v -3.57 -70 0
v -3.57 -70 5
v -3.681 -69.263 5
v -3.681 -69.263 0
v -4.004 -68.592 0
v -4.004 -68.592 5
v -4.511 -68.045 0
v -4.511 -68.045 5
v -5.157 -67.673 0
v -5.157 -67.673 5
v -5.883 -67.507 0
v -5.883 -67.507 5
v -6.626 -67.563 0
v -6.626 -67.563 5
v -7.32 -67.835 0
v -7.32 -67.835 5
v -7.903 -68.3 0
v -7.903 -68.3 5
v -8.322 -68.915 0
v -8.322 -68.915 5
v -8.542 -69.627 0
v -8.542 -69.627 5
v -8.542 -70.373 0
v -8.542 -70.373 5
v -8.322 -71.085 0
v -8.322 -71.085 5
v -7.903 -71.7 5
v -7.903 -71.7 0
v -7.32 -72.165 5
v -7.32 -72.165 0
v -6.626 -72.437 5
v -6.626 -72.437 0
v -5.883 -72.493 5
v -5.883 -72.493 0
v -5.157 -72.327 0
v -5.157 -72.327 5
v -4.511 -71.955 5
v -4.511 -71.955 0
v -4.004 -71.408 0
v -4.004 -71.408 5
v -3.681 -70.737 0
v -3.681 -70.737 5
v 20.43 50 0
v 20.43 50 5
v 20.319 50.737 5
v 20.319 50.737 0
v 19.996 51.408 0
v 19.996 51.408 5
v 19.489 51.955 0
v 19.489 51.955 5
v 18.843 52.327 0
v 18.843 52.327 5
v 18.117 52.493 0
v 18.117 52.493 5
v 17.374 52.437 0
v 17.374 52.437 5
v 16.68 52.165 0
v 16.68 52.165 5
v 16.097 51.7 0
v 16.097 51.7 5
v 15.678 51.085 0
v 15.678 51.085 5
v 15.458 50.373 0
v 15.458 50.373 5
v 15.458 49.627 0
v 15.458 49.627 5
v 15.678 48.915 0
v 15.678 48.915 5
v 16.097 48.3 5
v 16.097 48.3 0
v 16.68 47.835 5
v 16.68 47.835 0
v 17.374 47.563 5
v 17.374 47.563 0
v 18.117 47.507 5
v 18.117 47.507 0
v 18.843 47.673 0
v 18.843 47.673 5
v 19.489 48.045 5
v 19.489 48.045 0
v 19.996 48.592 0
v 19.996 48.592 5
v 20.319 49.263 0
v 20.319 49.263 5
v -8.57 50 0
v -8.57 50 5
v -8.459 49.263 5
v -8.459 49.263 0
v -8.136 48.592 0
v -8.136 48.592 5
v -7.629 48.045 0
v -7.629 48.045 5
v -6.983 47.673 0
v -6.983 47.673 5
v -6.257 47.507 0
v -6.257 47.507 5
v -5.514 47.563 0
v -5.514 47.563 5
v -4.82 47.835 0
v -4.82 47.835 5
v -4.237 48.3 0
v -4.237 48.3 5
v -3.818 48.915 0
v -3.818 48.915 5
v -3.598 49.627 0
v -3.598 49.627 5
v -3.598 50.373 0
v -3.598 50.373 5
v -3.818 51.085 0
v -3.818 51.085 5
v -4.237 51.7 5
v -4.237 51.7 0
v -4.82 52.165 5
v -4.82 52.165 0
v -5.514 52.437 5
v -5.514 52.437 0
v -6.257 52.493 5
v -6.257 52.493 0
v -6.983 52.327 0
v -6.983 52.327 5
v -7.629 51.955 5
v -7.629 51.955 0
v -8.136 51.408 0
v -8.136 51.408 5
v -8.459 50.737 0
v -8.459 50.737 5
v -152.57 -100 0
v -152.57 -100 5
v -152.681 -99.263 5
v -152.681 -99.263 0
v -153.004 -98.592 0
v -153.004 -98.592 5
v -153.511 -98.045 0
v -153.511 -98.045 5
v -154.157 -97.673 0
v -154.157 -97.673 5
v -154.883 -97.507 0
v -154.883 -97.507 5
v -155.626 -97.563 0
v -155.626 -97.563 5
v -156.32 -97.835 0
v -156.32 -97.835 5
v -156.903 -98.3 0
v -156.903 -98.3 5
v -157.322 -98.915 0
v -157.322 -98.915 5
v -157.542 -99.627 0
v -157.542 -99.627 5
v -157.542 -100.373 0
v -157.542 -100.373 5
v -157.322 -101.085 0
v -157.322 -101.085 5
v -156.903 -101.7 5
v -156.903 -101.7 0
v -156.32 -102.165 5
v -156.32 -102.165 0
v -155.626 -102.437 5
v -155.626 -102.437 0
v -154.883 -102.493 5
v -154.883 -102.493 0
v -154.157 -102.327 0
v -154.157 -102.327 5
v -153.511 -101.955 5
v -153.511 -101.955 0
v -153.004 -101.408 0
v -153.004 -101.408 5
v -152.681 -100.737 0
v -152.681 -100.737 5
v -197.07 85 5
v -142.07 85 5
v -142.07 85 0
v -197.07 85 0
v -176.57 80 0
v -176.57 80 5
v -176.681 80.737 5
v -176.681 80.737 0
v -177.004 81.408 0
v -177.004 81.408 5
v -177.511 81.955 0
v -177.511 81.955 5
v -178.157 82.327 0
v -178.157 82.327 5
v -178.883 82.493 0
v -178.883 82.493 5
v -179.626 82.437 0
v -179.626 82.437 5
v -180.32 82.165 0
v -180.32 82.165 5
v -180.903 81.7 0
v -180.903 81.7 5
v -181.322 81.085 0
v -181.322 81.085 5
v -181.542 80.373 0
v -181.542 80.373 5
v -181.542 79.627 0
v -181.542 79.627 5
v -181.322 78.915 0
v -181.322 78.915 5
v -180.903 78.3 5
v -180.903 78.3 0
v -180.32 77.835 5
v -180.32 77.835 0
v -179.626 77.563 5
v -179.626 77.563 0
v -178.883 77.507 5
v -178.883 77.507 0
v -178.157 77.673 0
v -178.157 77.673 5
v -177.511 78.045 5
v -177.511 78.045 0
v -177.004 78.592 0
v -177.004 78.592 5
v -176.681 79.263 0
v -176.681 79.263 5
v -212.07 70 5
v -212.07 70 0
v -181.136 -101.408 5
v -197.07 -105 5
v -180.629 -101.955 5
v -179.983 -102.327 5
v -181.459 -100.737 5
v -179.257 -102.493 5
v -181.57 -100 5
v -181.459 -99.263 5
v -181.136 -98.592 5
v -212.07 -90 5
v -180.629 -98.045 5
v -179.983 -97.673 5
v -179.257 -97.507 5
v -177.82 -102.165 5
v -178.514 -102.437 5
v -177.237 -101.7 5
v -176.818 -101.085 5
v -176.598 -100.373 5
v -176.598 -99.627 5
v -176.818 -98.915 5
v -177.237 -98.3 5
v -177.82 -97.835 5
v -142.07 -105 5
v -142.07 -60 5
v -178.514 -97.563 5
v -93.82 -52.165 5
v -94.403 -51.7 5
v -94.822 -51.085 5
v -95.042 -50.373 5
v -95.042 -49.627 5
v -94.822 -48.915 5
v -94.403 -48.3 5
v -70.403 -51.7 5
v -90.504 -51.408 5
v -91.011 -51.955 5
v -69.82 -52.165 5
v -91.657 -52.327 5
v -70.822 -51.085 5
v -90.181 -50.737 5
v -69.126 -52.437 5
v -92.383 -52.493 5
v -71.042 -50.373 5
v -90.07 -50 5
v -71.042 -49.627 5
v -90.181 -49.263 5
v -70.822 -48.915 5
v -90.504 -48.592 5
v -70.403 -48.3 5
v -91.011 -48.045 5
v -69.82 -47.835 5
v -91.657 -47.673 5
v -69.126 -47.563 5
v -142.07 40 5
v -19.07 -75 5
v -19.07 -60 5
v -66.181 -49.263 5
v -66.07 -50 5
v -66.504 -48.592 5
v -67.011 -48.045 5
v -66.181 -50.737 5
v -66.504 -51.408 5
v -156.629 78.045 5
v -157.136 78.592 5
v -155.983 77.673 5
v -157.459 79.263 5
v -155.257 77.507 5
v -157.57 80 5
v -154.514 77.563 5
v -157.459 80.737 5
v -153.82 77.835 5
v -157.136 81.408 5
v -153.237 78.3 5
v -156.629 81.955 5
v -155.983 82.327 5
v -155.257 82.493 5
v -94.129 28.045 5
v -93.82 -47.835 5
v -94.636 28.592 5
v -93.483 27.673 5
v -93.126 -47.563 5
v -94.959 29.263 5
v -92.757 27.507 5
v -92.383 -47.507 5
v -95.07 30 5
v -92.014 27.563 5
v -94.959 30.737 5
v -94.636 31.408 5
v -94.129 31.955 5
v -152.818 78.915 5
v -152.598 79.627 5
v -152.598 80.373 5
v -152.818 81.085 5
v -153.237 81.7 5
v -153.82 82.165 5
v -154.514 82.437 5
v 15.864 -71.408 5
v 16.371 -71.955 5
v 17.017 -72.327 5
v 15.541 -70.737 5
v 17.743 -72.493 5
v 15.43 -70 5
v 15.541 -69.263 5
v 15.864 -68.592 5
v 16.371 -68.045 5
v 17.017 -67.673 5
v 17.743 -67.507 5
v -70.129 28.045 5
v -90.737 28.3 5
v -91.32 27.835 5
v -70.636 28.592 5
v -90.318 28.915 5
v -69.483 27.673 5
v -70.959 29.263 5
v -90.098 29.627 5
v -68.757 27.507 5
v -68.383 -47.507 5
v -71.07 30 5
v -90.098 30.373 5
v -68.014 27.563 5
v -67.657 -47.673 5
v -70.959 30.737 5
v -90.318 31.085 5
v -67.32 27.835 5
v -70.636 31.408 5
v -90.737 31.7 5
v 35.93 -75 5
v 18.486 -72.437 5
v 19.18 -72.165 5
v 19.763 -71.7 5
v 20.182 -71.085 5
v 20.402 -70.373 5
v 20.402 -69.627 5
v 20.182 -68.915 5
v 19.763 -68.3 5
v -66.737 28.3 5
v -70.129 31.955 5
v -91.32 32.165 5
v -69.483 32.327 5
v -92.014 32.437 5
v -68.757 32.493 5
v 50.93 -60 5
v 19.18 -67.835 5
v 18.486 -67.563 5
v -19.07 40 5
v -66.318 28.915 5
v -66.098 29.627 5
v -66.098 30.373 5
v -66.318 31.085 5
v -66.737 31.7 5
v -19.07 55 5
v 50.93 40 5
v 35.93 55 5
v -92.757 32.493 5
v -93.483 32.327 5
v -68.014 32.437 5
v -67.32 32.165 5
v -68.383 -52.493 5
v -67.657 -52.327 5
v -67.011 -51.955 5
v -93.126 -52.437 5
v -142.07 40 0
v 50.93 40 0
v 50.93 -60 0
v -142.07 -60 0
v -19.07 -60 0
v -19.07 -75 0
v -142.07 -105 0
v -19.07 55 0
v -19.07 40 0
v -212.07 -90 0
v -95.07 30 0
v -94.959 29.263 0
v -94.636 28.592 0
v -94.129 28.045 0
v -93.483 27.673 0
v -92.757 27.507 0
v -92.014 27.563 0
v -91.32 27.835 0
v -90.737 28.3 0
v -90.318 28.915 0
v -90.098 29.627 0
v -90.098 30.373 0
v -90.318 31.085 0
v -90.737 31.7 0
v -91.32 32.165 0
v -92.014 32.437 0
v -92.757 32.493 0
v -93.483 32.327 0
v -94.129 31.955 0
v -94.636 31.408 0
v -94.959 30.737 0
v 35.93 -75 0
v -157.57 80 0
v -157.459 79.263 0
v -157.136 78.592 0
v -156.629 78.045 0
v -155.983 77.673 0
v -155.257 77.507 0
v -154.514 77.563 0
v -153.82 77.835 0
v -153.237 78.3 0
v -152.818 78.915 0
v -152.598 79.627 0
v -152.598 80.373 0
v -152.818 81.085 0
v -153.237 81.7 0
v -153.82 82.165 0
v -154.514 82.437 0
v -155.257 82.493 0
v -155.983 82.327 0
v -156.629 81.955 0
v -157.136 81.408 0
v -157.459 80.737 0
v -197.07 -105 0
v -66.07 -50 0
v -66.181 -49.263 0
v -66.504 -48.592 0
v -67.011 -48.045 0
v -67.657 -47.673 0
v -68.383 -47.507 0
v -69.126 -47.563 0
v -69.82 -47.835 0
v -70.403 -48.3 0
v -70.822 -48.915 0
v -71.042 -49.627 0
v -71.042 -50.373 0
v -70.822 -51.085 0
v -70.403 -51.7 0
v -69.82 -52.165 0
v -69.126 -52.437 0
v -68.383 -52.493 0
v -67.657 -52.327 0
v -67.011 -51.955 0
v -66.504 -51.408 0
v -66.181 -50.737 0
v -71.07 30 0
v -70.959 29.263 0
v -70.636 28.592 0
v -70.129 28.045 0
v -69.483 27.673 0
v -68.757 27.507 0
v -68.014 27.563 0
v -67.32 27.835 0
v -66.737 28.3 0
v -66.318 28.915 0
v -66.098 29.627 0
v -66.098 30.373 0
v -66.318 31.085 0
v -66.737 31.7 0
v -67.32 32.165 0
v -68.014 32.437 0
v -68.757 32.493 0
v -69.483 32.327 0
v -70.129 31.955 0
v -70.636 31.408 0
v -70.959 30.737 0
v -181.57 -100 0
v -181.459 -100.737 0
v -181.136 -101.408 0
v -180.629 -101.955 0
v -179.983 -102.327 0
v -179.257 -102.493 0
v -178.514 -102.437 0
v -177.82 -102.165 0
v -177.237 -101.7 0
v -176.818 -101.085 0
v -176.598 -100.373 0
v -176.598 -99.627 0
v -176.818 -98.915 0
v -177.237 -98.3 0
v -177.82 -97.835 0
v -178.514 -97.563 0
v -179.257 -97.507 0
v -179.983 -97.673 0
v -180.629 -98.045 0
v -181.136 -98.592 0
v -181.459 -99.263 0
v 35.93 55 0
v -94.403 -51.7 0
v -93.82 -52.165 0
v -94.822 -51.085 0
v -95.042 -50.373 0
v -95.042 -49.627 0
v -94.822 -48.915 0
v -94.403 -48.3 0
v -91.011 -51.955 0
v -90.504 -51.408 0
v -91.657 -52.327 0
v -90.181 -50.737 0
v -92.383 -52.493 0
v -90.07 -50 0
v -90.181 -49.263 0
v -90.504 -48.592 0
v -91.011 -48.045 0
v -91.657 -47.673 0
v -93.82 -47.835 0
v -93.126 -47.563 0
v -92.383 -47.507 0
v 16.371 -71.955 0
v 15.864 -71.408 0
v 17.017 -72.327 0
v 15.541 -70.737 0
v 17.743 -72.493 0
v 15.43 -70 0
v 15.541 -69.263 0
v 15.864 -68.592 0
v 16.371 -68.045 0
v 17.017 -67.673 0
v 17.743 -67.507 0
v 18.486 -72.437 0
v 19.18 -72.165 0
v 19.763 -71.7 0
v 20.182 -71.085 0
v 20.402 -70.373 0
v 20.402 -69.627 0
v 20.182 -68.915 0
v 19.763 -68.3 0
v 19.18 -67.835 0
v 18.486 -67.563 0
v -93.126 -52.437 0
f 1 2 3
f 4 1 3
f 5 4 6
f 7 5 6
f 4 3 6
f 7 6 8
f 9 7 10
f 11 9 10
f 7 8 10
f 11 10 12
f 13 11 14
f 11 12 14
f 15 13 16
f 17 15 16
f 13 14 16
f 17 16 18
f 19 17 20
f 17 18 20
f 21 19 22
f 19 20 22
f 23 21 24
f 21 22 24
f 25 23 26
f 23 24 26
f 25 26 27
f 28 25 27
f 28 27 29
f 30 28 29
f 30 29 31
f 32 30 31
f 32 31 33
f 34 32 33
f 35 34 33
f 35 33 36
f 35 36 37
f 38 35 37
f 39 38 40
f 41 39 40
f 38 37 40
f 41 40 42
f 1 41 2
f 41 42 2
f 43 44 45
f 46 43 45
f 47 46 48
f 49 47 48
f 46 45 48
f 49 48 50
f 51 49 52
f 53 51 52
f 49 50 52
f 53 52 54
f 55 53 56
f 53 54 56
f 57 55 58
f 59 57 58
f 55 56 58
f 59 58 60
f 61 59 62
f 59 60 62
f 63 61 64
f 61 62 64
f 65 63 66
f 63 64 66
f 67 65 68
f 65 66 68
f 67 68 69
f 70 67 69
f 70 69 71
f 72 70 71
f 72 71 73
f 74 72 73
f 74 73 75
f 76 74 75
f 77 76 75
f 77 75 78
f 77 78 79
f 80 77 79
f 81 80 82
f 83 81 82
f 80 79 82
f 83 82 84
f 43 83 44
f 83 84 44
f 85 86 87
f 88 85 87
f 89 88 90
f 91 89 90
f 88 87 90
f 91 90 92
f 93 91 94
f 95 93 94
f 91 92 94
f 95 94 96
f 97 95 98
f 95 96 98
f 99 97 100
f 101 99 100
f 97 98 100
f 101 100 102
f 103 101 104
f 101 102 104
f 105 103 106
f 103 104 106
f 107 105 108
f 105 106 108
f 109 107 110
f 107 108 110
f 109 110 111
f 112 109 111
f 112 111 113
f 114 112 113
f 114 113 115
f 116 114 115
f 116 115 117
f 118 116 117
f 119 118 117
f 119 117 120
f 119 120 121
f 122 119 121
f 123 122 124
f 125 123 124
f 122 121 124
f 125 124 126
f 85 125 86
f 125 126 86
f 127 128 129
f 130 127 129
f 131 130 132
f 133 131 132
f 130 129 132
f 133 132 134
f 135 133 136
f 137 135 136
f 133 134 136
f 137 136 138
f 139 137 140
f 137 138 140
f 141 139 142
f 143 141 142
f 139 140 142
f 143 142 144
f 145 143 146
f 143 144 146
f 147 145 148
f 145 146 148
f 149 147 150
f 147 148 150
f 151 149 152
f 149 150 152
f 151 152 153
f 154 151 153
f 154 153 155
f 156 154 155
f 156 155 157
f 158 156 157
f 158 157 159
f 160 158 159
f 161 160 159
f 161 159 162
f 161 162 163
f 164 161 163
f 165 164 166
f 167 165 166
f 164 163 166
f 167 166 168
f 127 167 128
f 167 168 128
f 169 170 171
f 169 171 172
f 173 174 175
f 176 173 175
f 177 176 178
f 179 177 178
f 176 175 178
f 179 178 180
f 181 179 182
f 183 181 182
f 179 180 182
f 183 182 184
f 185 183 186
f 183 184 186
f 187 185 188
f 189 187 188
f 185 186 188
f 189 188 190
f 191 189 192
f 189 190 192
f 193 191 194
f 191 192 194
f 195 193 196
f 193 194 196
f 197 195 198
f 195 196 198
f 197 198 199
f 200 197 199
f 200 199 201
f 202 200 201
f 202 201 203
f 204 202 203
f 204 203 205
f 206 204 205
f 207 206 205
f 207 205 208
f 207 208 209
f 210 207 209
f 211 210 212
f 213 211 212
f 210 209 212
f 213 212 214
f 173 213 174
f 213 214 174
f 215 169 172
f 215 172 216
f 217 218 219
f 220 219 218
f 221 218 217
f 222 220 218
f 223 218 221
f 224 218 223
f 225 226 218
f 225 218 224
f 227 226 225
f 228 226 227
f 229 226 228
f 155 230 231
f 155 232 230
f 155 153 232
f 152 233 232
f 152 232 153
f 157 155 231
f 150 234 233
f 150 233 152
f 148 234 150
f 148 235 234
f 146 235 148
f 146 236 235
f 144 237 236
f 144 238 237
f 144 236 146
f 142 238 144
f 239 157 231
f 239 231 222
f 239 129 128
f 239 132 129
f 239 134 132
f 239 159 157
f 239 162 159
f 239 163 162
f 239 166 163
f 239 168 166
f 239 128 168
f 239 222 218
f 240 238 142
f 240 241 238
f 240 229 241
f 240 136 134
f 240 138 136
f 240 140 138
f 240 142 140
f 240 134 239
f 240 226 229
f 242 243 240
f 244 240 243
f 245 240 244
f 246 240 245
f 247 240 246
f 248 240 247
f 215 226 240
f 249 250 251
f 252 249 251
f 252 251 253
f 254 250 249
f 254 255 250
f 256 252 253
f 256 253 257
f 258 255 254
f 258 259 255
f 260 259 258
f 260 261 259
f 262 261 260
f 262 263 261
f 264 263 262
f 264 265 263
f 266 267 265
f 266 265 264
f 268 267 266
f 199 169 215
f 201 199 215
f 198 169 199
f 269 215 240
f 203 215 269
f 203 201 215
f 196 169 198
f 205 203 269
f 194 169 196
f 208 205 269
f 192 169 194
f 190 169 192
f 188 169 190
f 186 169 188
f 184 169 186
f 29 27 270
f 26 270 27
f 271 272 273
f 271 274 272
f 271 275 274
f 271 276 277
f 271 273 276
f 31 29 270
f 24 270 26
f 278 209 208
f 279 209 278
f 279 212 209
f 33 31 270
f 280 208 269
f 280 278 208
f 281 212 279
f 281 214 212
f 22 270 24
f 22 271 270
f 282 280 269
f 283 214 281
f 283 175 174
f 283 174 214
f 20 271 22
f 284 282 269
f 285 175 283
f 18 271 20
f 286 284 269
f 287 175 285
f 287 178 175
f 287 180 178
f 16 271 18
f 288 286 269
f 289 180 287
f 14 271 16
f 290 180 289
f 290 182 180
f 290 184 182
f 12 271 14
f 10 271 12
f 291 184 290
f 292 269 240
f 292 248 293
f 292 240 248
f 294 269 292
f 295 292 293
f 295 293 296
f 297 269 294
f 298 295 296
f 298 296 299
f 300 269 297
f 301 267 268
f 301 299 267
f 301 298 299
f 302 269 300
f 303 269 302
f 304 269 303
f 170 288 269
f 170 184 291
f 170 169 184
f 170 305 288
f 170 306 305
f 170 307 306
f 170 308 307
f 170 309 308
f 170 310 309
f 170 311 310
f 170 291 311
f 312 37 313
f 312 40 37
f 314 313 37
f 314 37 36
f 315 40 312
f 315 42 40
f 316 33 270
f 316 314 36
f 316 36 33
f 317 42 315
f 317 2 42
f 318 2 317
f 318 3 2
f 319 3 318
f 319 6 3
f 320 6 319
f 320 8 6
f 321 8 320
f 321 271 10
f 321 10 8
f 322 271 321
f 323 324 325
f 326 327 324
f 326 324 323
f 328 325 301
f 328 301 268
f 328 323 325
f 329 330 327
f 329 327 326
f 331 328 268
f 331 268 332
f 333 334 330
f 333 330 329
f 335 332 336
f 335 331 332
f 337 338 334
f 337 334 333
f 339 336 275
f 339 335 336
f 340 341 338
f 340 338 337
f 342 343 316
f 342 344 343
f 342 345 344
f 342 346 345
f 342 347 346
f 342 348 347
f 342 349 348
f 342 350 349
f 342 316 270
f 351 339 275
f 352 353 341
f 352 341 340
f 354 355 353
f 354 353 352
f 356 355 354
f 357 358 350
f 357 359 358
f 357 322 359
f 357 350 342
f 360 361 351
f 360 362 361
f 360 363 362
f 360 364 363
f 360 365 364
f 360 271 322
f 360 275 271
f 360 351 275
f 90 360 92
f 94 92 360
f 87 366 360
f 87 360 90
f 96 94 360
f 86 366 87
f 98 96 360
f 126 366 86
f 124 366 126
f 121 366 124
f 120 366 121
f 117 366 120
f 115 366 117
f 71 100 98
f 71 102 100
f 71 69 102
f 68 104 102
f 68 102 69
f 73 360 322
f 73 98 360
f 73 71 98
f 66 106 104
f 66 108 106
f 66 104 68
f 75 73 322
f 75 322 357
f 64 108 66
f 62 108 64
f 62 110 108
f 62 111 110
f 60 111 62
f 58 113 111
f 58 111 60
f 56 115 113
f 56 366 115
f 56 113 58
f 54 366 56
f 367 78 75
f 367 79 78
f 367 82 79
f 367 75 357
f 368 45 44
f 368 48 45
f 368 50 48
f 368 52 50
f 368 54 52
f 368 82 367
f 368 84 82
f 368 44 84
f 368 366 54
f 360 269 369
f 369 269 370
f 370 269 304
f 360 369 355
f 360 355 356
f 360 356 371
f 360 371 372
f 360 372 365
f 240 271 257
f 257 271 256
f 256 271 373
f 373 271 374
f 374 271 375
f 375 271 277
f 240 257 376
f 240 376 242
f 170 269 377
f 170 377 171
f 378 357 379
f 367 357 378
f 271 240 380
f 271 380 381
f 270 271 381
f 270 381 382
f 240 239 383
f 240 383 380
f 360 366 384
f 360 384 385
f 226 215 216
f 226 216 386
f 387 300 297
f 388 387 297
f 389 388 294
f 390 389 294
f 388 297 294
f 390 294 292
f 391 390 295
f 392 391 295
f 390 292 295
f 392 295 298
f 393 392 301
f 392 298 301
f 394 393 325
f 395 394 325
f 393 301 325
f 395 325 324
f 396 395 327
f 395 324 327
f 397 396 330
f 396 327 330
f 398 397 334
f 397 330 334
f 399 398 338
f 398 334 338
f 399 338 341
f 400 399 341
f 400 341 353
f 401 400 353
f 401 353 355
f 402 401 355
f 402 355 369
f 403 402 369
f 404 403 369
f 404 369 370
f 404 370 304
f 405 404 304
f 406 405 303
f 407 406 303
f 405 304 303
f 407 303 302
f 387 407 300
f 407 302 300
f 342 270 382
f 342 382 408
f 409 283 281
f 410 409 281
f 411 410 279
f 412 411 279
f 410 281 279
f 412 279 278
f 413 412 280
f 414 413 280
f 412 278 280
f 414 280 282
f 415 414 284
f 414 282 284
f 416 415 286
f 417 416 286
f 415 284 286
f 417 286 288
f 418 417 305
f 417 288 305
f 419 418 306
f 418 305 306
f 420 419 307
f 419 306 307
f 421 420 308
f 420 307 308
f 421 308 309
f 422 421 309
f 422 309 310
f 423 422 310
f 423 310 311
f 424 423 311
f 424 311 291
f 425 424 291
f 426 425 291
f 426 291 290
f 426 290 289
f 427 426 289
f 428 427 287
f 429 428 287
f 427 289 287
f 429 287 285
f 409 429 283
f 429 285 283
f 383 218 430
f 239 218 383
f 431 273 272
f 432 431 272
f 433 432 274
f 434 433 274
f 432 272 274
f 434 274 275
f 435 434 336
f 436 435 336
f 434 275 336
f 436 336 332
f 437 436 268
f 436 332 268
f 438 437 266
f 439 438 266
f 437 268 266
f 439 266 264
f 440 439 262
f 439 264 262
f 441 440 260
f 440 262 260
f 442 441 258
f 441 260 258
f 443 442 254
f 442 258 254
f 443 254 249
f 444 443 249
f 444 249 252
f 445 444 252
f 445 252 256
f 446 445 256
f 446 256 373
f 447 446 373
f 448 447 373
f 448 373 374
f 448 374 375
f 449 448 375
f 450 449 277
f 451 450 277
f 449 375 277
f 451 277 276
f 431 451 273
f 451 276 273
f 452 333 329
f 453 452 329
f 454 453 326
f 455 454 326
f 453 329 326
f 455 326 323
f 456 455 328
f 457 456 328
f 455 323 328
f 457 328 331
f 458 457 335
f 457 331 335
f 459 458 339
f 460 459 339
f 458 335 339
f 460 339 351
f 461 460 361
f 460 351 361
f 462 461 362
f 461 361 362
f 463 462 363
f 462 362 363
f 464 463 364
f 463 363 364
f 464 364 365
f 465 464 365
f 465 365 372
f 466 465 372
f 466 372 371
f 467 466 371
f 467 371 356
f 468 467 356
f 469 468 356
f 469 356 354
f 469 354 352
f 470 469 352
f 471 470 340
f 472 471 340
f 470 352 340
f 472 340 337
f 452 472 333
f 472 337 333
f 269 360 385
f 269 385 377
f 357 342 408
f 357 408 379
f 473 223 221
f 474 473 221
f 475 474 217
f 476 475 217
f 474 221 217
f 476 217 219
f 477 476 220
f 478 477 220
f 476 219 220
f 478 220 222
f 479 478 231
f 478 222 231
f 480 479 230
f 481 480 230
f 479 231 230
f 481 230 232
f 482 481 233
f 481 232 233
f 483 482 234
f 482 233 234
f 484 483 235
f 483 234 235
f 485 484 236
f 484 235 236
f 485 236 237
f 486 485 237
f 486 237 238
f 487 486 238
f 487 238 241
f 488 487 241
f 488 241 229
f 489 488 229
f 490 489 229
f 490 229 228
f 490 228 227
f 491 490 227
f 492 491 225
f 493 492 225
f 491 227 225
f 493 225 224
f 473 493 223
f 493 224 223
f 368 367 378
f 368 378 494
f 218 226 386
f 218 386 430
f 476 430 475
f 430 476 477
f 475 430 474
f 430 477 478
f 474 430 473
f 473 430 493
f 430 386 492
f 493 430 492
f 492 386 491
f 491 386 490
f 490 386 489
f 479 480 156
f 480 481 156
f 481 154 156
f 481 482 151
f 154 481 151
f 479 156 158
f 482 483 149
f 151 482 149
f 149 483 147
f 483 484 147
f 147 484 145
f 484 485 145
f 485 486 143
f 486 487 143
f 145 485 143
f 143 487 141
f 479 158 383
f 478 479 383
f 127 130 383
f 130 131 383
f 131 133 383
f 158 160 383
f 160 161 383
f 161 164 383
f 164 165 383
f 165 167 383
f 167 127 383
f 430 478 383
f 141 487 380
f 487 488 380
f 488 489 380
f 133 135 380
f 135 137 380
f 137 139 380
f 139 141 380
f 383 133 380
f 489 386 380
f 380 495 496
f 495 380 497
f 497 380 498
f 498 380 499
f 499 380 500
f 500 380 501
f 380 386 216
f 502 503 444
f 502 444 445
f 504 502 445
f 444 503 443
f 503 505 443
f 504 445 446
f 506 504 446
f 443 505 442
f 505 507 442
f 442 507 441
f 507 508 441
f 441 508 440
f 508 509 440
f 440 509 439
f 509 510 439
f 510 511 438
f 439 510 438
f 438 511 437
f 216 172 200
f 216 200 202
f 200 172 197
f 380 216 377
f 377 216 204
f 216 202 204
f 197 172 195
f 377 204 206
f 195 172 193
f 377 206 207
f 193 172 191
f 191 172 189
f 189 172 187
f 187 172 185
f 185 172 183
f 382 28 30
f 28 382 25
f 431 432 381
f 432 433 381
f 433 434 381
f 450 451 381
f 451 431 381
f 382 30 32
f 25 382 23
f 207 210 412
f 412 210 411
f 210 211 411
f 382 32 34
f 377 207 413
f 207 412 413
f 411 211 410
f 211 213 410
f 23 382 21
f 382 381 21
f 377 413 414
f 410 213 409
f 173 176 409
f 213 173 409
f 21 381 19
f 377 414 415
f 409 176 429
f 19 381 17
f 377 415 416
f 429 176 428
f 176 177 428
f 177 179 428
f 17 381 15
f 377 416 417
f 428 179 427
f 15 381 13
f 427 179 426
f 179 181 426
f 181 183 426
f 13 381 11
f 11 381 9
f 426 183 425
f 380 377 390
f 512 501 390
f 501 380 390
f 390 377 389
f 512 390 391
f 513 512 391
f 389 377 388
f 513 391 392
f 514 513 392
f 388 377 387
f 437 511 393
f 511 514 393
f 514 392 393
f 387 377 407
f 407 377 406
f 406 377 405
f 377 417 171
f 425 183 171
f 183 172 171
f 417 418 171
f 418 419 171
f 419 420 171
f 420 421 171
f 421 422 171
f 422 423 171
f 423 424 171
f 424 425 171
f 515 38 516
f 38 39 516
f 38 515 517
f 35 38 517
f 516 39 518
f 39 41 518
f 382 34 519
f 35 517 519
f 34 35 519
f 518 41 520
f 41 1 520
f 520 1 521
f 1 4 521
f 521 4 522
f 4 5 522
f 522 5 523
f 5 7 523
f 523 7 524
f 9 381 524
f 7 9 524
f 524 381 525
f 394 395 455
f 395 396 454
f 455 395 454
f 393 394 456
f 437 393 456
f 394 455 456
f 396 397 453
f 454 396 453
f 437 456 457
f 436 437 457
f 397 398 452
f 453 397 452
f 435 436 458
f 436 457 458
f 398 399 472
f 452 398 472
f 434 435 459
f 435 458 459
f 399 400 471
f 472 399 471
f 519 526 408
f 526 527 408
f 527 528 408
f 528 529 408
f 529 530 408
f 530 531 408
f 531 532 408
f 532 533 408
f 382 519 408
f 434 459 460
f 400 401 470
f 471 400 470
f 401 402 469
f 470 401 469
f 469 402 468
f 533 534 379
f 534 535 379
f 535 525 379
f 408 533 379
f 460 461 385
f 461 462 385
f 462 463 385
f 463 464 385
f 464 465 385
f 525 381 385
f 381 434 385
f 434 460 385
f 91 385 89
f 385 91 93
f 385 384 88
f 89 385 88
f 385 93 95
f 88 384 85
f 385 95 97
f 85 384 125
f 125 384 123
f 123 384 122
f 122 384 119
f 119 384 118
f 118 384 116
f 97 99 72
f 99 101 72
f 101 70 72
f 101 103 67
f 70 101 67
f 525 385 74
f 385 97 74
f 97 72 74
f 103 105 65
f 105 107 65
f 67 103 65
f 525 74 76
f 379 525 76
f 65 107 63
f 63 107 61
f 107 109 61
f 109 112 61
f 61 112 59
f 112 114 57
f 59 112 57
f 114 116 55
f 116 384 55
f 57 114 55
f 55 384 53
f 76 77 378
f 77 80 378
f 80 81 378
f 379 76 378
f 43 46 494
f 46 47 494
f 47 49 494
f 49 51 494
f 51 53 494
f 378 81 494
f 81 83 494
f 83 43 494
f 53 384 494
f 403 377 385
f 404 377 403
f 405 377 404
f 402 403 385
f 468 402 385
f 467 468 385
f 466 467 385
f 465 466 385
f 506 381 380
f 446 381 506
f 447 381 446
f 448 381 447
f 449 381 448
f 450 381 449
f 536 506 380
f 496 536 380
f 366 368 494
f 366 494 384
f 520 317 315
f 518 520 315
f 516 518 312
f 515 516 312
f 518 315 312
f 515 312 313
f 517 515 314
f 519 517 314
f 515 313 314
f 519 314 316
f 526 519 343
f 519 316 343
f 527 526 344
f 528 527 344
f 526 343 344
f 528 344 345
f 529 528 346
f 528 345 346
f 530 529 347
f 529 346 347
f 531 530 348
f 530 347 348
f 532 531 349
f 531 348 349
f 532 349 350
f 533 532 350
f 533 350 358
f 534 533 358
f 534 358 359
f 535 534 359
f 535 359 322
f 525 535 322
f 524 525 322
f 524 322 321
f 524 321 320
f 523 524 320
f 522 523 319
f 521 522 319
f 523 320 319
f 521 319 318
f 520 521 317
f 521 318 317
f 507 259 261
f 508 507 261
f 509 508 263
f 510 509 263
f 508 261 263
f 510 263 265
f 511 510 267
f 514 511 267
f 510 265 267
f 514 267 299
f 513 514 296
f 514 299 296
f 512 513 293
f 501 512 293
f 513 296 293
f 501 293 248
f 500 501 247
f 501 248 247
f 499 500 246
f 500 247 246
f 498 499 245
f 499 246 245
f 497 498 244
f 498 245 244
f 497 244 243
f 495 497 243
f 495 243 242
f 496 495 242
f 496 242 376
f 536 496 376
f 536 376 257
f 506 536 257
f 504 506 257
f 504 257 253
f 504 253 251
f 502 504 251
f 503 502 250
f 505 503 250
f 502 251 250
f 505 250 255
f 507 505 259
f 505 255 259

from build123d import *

# Parameters (mm, degrees)
SKETCH_1_R      = 2.5
EXTRUDE_1_DEPTH = 5


with BuildPart() as part:
    # 草图1 → 凸台-拉伸1 (new body)
    with BuildSketch(Plane.XY.offset(5)):
        Polygon((50.930030436, -59.99999996), (50.930030436, 39.999999938), (35.930030436, 54.999999938), (-19.069969566, 54.999999938), (-19.069969566, 39.999999989), (-142.069969574, 39.999999989), (-142.069969574, 84.999999989), (-197.069969604, 84.999999989), (-212.069969578, 70.000000014), (-212.069969578, -90.000000037), (-197.069969604, -105.000000011), (-142.069969574, -105.000000011), (-142.069969574, -60.000000011), (-19.069969566, -60.000000011), (-19.069969566, -74.99999996), (35.930030436, -74.99999996), align=None)
        with Locations((-179.069969574, 79.999999989)):
            Circle(SKETCH_1_R, mode=Mode.SUBTRACT)
        with Locations(Location((-6.069969566, 49.999999938, 0), (0, 0, 180))):
            Circle(SKETCH_1_R, mode=Mode.SUBTRACT)
        with Locations(Location((-155.069969574, 79.999999989, 0), (0, 0, 180))):
            Circle(SKETCH_1_R, mode=Mode.SUBTRACT)
        with Locations(Location((-92.569969578, 30.000000012, 0), (0, 0, 180))):
            Circle(SKETCH_1_R, mode=Mode.SUBTRACT)
        with Locations(Location((-68.569969578, 30, 0), (0, 0, 180))):
            Circle(SKETCH_1_R, mode=Mode.SUBTRACT)
        with Locations((17.930030434, 49.999999938)):
            Circle(SKETCH_1_R, mode=Mode.SUBTRACT)
        with Locations(Location((17.930030434, -69.99999996, 0), (0, 0, 180))):
            Circle(SKETCH_1_R, mode=Mode.SUBTRACT)
        with Locations((-68.569969578, -50.000000023)):
            Circle(SKETCH_1_R, mode=Mode.SUBTRACT)
        with Locations((-92.569969578, -50.000000034)):
            Circle(SKETCH_1_R, mode=Mode.SUBTRACT)
        with Locations((-155.069969574, -100.000000011)):
            Circle(SKETCH_1_R, mode=Mode.SUBTRACT)
        with Locations((-6.069969566, -69.99999996)):
            Circle(SKETCH_1_R, mode=Mode.SUBTRACT)
        with Locations(Location((-179.069969574, -100.000000011, 0), (0, 0, 180))):
            Circle(SKETCH_1_R, mode=Mode.SUBTRACT)
    extrude(amount=-EXTRUDE_1_DEPTH)


solid = part.part
